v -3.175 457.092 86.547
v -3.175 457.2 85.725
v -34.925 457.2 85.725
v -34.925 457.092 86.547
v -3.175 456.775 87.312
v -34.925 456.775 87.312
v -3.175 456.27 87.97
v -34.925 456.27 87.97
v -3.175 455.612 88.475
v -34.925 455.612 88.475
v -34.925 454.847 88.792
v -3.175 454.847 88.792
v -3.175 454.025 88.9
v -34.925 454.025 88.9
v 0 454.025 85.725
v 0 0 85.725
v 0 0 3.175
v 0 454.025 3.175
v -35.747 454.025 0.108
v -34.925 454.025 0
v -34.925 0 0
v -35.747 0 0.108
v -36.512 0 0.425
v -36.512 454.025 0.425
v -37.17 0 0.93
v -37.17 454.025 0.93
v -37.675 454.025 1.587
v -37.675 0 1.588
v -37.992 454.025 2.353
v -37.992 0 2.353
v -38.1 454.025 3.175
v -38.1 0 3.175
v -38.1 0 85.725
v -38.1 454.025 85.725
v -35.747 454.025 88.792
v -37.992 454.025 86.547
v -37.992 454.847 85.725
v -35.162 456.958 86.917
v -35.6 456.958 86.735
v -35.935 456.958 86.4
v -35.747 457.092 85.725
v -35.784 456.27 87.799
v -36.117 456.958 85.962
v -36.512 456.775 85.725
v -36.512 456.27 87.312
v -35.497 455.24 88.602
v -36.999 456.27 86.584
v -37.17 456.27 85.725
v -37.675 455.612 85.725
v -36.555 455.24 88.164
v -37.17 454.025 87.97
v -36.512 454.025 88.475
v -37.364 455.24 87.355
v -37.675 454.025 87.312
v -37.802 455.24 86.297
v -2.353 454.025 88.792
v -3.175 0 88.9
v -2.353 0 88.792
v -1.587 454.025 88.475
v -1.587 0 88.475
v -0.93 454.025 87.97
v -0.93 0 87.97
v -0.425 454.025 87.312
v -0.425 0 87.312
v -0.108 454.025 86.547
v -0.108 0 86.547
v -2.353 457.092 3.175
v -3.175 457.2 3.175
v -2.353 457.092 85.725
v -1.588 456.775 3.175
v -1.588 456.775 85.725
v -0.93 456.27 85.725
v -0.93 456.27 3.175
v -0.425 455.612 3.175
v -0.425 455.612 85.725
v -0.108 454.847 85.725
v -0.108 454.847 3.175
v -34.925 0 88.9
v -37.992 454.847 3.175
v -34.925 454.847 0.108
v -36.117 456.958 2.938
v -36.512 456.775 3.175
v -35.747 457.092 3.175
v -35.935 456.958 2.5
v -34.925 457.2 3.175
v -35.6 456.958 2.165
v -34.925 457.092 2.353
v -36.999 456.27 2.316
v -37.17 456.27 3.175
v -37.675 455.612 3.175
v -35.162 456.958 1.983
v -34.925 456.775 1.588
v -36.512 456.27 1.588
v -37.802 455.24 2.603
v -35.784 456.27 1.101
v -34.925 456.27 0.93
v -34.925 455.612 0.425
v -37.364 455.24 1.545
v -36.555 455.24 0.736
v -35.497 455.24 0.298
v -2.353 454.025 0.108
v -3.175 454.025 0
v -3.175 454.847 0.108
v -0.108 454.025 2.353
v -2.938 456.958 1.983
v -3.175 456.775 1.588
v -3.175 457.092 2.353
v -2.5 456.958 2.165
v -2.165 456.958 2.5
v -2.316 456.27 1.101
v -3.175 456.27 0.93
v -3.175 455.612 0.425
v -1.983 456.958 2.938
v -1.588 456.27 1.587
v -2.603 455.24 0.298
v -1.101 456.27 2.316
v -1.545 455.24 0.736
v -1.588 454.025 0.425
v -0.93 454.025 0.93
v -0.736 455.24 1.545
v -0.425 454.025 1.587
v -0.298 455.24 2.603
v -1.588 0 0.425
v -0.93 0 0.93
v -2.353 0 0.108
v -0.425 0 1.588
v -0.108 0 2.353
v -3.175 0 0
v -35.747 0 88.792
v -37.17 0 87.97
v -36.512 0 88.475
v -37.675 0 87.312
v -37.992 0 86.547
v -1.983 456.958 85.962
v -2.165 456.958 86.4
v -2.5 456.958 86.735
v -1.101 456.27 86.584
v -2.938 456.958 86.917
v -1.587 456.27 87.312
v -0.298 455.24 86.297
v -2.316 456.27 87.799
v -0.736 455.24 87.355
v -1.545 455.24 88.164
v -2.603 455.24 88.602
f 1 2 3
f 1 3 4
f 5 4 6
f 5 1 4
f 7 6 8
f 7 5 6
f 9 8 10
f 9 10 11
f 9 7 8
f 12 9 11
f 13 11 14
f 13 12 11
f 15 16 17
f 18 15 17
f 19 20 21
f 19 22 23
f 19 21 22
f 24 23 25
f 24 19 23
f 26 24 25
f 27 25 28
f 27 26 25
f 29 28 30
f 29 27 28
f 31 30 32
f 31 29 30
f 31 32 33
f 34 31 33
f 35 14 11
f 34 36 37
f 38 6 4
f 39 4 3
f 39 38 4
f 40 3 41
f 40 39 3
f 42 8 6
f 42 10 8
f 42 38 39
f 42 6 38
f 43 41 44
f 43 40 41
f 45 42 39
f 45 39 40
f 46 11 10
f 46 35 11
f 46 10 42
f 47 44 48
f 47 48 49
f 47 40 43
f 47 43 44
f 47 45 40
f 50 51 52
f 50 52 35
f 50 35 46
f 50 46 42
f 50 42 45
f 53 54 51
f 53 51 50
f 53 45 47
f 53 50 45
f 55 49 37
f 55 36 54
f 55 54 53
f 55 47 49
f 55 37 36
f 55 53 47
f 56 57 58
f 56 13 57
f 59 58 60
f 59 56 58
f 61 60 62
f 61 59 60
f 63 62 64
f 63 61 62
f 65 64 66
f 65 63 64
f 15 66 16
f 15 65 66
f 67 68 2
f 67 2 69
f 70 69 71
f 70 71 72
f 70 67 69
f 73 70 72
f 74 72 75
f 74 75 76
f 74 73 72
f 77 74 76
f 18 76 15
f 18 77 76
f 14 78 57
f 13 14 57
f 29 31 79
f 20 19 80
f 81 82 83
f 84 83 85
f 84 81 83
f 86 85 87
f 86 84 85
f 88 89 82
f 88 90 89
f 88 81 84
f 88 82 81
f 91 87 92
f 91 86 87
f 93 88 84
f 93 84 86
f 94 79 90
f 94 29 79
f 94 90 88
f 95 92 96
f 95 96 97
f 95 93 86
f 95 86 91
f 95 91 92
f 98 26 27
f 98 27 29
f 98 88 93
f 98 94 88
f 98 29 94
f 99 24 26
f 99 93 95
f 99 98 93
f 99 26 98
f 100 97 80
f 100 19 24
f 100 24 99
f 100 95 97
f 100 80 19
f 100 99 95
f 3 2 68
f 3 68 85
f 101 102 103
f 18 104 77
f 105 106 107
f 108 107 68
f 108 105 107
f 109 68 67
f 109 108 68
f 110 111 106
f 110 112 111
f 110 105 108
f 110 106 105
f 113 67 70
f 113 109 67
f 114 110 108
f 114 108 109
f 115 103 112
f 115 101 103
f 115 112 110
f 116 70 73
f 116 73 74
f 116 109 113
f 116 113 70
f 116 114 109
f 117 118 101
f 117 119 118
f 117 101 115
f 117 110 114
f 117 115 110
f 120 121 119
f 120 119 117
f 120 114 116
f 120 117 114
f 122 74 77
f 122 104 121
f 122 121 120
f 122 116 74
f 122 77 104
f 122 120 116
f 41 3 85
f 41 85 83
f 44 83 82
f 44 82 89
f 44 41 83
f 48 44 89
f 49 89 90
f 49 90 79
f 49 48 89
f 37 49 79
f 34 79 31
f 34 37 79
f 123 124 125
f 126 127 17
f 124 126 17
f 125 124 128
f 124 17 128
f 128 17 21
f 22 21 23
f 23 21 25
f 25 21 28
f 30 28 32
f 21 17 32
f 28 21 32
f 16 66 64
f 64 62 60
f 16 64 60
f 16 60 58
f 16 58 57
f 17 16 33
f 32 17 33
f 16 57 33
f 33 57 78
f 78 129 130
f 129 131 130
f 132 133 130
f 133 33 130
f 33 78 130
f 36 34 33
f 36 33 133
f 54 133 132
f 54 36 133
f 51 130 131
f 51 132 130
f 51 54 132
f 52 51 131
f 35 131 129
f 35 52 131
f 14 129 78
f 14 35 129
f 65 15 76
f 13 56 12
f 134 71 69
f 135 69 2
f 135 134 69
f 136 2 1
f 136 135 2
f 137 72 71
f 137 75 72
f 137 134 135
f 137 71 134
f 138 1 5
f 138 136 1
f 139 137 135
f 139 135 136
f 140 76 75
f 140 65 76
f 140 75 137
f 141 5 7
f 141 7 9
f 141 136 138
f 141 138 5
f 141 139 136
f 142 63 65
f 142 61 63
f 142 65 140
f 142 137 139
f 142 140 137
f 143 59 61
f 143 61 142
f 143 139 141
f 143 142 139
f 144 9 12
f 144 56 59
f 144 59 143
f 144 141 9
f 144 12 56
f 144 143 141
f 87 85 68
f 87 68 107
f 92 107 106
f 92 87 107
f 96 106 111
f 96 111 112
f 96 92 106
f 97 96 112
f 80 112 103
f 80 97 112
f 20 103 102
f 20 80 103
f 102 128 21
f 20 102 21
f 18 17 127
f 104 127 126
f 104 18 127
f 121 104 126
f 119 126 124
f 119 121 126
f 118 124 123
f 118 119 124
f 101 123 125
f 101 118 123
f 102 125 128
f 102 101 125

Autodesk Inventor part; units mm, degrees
ref_plane "YZ Plane" through (0, 0, 0) normal (1, 0, 0) x (0, 1, 0)
ref_plane "XZ Plane" through (0, 0, 0) normal (0, 1, 0) x (-1, 0, 0)
ref_plane "XY Plane" through (0, 0, 0) normal (0, 0, 1) x (1, 0, 0)
sketch "Sketch1" plane through (0, 0, 0) normal (0, 1, 0) x (-1, 0, 0)
  line L0 (0, 0) -> (38.1, 0)
  line L1 (38.1, 0) -> (38.1, 88.9)
  line L2 (38.1, 88.9) -> (0, 88.9)
  line L3 (0, 88.9) -> (0, 0)
  dimension "d0" = 38.1
  dimension "d1" = 88.9
extrude "Extrusion1" add sketch "Sketch1" along normal blind 457.2
fillet "Fillet1" radius 3.175 8 edges at (0, 228.6, 88.9) (-38.1, 228.6, 88.9) (0, 228.6, 0) (-38.1, 228.6, 0) (-19.05, 457.2, 0) (0, 457.2, 44.45) (-38.1, 457.2, 44.45) (-19.05, 457.2, 88.9)
properties part number "Barren Stand"
